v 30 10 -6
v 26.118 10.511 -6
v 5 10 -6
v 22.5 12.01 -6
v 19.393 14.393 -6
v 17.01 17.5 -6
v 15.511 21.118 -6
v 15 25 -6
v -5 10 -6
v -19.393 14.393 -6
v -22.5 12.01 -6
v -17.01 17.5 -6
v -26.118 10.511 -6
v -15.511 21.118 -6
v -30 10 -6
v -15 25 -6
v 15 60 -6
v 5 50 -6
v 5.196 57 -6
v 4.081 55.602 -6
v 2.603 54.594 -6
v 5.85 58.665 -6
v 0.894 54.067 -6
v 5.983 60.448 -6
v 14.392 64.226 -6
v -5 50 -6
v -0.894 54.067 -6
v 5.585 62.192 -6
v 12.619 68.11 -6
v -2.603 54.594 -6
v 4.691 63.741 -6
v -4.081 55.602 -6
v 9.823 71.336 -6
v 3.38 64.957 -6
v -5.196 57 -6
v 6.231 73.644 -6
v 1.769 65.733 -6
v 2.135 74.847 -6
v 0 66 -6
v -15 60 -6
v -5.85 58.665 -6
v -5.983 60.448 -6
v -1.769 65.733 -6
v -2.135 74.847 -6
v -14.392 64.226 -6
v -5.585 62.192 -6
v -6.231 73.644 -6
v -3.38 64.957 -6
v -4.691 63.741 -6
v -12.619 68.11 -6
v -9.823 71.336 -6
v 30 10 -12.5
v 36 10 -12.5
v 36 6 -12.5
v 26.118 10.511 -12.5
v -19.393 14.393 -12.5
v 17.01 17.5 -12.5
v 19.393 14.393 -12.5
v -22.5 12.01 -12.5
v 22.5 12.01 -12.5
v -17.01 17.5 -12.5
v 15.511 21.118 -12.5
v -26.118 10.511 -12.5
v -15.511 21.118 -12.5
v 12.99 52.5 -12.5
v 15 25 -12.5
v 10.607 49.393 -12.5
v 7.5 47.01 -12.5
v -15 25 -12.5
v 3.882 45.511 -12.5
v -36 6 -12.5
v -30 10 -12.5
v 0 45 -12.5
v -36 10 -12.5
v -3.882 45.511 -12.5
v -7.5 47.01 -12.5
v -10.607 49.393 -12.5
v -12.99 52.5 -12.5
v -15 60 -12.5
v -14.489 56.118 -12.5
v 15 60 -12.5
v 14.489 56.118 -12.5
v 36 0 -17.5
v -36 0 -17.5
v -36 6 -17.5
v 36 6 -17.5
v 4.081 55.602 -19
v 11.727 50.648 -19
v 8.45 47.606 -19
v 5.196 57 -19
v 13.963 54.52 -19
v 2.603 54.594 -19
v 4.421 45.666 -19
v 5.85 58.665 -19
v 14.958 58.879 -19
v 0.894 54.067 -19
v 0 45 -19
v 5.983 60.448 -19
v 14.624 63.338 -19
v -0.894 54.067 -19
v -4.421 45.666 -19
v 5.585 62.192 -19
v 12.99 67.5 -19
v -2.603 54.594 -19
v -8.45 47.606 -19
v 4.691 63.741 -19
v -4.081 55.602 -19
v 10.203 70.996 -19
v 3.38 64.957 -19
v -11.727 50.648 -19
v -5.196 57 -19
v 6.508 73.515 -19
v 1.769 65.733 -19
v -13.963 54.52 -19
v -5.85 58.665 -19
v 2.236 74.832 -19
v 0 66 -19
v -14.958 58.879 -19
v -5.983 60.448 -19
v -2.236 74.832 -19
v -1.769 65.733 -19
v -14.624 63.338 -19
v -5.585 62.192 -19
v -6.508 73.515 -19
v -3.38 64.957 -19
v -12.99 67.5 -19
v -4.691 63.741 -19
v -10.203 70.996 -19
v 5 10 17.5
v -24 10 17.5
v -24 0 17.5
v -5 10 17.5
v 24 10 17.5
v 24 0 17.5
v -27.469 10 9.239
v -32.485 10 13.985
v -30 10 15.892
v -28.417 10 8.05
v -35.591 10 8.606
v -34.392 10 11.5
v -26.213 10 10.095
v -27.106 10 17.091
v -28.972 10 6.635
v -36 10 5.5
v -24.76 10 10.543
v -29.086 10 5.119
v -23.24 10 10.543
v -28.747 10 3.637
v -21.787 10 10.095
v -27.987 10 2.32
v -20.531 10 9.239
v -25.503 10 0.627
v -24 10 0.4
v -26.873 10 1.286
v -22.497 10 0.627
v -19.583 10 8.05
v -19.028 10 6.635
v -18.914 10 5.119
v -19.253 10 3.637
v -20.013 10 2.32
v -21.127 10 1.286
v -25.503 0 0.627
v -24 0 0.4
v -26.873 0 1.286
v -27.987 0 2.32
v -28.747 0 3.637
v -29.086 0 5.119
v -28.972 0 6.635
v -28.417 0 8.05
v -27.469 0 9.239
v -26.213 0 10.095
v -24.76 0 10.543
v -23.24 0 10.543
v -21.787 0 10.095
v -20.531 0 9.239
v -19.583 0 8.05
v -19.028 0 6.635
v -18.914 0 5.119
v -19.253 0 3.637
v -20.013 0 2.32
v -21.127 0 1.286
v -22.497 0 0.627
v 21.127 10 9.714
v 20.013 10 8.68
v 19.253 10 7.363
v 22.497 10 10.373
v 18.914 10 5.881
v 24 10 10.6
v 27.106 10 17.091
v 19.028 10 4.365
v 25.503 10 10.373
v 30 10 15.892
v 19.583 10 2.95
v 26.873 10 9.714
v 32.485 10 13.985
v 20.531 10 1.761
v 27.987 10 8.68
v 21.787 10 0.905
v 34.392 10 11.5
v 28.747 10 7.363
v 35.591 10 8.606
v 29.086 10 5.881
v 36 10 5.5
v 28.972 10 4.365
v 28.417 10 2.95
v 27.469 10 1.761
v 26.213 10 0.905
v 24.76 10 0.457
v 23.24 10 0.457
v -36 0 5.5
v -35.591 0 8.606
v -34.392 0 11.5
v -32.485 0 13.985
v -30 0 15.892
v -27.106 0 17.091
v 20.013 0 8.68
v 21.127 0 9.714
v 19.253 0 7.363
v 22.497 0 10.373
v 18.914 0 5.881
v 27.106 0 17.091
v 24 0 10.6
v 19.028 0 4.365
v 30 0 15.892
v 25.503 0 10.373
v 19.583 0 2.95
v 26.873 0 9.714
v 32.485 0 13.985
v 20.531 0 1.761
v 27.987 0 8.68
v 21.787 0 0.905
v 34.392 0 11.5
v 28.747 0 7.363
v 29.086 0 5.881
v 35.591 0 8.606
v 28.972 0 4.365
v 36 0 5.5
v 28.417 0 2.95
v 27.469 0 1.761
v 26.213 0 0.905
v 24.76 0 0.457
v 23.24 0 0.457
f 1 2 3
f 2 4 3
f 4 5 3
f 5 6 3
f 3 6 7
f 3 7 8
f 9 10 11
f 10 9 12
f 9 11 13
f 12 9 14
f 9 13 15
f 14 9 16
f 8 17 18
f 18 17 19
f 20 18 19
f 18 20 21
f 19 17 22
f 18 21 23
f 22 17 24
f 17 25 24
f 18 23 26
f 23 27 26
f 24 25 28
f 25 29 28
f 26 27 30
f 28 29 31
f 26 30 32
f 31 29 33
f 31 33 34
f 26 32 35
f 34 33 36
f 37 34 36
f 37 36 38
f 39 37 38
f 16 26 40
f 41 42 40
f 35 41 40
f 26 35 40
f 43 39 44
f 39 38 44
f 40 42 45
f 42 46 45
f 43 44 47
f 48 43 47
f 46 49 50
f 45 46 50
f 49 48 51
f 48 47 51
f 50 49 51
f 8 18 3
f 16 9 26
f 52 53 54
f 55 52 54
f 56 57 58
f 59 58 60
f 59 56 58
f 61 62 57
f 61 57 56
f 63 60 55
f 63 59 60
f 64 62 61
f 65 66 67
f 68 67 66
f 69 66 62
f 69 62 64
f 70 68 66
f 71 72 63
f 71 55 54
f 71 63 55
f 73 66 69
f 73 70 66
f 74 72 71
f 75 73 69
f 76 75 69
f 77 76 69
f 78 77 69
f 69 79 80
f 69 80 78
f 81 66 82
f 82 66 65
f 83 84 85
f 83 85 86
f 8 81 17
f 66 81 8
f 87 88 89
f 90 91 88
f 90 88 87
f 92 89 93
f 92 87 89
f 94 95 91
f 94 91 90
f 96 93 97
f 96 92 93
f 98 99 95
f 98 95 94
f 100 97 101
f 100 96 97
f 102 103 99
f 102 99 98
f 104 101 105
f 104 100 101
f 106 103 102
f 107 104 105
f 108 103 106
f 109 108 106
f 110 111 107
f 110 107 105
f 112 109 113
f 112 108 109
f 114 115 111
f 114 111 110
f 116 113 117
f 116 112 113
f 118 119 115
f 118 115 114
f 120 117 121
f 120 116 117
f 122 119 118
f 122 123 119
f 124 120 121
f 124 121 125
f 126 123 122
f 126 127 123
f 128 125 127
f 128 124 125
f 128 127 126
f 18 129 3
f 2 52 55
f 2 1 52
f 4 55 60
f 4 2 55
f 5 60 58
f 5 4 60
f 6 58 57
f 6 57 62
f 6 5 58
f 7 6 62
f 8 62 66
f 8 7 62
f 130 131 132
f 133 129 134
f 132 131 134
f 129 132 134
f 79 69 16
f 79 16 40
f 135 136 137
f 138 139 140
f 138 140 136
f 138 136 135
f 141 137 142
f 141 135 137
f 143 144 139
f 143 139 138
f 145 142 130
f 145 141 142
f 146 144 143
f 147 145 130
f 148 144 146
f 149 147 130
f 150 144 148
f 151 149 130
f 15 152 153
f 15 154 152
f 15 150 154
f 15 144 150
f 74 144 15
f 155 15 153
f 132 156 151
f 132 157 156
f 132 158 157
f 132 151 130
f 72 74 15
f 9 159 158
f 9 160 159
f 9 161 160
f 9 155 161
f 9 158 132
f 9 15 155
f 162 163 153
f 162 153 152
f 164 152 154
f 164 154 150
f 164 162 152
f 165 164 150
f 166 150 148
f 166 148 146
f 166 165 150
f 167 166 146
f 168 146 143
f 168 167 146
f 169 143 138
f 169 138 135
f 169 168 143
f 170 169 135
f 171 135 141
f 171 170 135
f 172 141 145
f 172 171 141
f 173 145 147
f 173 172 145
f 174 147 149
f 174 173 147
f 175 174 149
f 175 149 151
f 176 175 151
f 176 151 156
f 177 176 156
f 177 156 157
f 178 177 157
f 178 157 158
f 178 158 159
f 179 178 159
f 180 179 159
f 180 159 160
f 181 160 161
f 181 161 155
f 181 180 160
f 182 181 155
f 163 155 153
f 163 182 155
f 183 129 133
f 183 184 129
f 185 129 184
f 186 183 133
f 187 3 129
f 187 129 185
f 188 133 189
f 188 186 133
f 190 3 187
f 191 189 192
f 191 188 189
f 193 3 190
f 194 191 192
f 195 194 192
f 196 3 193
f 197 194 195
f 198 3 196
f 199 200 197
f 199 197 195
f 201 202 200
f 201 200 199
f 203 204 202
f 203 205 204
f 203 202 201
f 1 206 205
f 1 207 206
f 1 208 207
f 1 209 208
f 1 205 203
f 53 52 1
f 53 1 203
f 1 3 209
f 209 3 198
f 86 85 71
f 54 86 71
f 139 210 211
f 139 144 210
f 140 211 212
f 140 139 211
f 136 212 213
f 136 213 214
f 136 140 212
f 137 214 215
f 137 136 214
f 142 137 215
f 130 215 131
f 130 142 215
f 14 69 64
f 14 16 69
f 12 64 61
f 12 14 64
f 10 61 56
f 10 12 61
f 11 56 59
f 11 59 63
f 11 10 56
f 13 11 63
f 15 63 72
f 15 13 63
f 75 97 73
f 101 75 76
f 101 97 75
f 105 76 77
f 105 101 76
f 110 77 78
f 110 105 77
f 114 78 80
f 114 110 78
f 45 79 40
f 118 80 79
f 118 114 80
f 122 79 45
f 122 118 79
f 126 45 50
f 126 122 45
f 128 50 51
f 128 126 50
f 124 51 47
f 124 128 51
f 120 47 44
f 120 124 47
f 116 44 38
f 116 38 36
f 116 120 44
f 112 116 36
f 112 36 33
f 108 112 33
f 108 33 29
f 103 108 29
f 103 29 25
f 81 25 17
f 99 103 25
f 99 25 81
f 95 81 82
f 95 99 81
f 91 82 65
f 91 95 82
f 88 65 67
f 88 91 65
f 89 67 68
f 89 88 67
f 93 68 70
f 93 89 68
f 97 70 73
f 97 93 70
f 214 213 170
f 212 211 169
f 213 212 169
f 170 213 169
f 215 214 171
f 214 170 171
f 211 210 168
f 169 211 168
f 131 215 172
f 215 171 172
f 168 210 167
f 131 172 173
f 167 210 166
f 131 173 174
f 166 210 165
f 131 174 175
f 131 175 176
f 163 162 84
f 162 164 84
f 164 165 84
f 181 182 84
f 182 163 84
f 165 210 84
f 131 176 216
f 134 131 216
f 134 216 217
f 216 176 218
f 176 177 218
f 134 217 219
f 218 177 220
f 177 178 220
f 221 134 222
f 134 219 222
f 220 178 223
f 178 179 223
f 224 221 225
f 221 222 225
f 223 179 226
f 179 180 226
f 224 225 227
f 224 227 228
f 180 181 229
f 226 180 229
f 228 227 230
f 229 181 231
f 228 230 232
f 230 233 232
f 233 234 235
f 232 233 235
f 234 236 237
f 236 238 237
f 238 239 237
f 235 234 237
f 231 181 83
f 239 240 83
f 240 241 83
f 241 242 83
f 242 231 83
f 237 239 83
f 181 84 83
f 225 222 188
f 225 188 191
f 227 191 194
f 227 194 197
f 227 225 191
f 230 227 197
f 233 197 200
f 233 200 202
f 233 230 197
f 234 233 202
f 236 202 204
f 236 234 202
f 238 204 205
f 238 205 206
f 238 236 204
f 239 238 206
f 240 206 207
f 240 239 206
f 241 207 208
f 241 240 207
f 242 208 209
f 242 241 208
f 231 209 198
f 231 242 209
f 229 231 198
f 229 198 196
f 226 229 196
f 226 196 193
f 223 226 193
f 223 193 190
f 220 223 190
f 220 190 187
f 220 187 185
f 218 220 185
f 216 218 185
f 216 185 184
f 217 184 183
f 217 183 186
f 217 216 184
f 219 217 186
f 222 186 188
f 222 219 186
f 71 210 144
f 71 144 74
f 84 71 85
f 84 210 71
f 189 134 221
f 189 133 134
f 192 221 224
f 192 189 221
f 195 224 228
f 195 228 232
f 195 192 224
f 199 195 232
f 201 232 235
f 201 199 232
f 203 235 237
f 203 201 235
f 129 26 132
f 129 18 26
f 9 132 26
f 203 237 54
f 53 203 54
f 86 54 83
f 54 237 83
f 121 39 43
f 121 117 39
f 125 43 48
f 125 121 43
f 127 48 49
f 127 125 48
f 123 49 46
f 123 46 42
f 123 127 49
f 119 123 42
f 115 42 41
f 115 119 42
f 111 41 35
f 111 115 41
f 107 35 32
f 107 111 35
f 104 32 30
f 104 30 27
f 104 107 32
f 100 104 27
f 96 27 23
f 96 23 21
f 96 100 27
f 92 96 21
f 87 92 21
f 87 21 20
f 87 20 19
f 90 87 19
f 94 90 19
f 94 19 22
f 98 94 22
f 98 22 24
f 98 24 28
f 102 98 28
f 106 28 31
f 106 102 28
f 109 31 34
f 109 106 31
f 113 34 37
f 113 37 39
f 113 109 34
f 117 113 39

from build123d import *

# Parameters (mm, degrees)
SKETCH1_W           = 72
SKETCH1_H           = 35
SKETCH1_R           = 5.1
BOSS_EXTRUDE1_DEPTH = 10
FILLET1_R           = 12
SKETCH3_W           = 5
SKETCH3_H           = 4
CUT_EXTRUDE1_DEPTH  = 75
SKETCH6_R           = 15
SKETCH6_R_2         = 6
BOSS_EXTRUDE2_DEPTH = 6.5
BOSS_EXTRUDE3_DEPTH = 6.5
FILLET2_R           = 15
BOSS_EXTRUDE4_DEPTH = 5


with BuildPart() as part:
    # Sketch1 → Boss-Extrude1 (new body)
    with BuildSketch(Plane(origin=(0, 0, 0), x_dir=(1, 0, 0), z_dir=(0, 1, 0))):
        Rectangle(SKETCH1_W, SKETCH1_H)
        with Locations((24, -5.5)):
            Circle(SKETCH1_R, mode=Mode.SUBTRACT)
        with Locations((-24, -5.5)):
            Circle(SKETCH1_R, mode=Mode.SUBTRACT)
    extrude(amount=BOSS_EXTRUDE1_DEPTH)

    # Fillet1
    fillet1_edges = [part.edges().sort_by_distance(p)[0] for p in [
        (-36, 5, 17.5),
        (36, 5, 17.5),
    ]]
    fillet(fillet1_edges, radius=FILLET1_R)

    # Sketch3 → Cut-Extrude1 (cut)
    with BuildSketch(Plane.ZY.offset(36)):
        with Locations((-15, 8)):
            Rectangle(SKETCH3_W, SKETCH3_H)
    extrude(amount=-CUT_EXTRUDE1_DEPTH, mode=Mode.SUBTRACT)



with BuildPart() as body_2:
    # Sketch6 → Boss-Extrude2 (new, symmetric)
    with BuildSketch(Plane(origin=(0, 0, -12.5), x_dir=(-1, 0, 0), z_dir=(0, 0, -1))):
        with Locations((0, 60)):
            Circle(SKETCH6_R)
        with Locations((0, 60)):
            Circle(SKETCH6_R_2, mode=Mode.SUBTRACT)
    extrude(amount=BOSS_EXTRUDE2_DEPTH, both=True)


with BuildPart() as part_1:
    add(part.part)

    add(body_2.part)  # Boss-Extrude3 merges body 2
    # Sketch6<3> → Boss-Extrude3 (add)
    with BuildSketch(Plane(origin=(0, 0, -12.5), x_dir=(-1, 0, 0), z_dir=(0, 0, -1))):
        with BuildLine():
            Line((-15, 10), (15, 10))
            Line((15, 10), (15, 60))
            ThreePointArc((15, 60), (0, 45), (-15, 60))
            Line((-15, 60), (-15, 10))
        make_face()
    extrude(amount=-BOSS_EXTRUDE3_DEPTH)

    # Fillet2
    fillet2_edges = [part_1.edges().sort_by_distance(p)[0] for p in [
        (-15, 10, -9.25),
        (15, 10, -9.25),
    ]]
    fillet(fillet2_edges, radius=FILLET2_R)

    # Sketch7 → Boss-Extrude4 (add, symmetric)
    with BuildSketch(Plane(origin=(0, 0, 0), x_dir=(0, 0, -1), z_dir=(1, 0, 0))):
        Polygon((-17.5, 10), (6, 10), (6, 50), align=None)
    extrude(amount=BOSS_EXTRUDE4_DEPTH, both=True)


solid = part_1.part
